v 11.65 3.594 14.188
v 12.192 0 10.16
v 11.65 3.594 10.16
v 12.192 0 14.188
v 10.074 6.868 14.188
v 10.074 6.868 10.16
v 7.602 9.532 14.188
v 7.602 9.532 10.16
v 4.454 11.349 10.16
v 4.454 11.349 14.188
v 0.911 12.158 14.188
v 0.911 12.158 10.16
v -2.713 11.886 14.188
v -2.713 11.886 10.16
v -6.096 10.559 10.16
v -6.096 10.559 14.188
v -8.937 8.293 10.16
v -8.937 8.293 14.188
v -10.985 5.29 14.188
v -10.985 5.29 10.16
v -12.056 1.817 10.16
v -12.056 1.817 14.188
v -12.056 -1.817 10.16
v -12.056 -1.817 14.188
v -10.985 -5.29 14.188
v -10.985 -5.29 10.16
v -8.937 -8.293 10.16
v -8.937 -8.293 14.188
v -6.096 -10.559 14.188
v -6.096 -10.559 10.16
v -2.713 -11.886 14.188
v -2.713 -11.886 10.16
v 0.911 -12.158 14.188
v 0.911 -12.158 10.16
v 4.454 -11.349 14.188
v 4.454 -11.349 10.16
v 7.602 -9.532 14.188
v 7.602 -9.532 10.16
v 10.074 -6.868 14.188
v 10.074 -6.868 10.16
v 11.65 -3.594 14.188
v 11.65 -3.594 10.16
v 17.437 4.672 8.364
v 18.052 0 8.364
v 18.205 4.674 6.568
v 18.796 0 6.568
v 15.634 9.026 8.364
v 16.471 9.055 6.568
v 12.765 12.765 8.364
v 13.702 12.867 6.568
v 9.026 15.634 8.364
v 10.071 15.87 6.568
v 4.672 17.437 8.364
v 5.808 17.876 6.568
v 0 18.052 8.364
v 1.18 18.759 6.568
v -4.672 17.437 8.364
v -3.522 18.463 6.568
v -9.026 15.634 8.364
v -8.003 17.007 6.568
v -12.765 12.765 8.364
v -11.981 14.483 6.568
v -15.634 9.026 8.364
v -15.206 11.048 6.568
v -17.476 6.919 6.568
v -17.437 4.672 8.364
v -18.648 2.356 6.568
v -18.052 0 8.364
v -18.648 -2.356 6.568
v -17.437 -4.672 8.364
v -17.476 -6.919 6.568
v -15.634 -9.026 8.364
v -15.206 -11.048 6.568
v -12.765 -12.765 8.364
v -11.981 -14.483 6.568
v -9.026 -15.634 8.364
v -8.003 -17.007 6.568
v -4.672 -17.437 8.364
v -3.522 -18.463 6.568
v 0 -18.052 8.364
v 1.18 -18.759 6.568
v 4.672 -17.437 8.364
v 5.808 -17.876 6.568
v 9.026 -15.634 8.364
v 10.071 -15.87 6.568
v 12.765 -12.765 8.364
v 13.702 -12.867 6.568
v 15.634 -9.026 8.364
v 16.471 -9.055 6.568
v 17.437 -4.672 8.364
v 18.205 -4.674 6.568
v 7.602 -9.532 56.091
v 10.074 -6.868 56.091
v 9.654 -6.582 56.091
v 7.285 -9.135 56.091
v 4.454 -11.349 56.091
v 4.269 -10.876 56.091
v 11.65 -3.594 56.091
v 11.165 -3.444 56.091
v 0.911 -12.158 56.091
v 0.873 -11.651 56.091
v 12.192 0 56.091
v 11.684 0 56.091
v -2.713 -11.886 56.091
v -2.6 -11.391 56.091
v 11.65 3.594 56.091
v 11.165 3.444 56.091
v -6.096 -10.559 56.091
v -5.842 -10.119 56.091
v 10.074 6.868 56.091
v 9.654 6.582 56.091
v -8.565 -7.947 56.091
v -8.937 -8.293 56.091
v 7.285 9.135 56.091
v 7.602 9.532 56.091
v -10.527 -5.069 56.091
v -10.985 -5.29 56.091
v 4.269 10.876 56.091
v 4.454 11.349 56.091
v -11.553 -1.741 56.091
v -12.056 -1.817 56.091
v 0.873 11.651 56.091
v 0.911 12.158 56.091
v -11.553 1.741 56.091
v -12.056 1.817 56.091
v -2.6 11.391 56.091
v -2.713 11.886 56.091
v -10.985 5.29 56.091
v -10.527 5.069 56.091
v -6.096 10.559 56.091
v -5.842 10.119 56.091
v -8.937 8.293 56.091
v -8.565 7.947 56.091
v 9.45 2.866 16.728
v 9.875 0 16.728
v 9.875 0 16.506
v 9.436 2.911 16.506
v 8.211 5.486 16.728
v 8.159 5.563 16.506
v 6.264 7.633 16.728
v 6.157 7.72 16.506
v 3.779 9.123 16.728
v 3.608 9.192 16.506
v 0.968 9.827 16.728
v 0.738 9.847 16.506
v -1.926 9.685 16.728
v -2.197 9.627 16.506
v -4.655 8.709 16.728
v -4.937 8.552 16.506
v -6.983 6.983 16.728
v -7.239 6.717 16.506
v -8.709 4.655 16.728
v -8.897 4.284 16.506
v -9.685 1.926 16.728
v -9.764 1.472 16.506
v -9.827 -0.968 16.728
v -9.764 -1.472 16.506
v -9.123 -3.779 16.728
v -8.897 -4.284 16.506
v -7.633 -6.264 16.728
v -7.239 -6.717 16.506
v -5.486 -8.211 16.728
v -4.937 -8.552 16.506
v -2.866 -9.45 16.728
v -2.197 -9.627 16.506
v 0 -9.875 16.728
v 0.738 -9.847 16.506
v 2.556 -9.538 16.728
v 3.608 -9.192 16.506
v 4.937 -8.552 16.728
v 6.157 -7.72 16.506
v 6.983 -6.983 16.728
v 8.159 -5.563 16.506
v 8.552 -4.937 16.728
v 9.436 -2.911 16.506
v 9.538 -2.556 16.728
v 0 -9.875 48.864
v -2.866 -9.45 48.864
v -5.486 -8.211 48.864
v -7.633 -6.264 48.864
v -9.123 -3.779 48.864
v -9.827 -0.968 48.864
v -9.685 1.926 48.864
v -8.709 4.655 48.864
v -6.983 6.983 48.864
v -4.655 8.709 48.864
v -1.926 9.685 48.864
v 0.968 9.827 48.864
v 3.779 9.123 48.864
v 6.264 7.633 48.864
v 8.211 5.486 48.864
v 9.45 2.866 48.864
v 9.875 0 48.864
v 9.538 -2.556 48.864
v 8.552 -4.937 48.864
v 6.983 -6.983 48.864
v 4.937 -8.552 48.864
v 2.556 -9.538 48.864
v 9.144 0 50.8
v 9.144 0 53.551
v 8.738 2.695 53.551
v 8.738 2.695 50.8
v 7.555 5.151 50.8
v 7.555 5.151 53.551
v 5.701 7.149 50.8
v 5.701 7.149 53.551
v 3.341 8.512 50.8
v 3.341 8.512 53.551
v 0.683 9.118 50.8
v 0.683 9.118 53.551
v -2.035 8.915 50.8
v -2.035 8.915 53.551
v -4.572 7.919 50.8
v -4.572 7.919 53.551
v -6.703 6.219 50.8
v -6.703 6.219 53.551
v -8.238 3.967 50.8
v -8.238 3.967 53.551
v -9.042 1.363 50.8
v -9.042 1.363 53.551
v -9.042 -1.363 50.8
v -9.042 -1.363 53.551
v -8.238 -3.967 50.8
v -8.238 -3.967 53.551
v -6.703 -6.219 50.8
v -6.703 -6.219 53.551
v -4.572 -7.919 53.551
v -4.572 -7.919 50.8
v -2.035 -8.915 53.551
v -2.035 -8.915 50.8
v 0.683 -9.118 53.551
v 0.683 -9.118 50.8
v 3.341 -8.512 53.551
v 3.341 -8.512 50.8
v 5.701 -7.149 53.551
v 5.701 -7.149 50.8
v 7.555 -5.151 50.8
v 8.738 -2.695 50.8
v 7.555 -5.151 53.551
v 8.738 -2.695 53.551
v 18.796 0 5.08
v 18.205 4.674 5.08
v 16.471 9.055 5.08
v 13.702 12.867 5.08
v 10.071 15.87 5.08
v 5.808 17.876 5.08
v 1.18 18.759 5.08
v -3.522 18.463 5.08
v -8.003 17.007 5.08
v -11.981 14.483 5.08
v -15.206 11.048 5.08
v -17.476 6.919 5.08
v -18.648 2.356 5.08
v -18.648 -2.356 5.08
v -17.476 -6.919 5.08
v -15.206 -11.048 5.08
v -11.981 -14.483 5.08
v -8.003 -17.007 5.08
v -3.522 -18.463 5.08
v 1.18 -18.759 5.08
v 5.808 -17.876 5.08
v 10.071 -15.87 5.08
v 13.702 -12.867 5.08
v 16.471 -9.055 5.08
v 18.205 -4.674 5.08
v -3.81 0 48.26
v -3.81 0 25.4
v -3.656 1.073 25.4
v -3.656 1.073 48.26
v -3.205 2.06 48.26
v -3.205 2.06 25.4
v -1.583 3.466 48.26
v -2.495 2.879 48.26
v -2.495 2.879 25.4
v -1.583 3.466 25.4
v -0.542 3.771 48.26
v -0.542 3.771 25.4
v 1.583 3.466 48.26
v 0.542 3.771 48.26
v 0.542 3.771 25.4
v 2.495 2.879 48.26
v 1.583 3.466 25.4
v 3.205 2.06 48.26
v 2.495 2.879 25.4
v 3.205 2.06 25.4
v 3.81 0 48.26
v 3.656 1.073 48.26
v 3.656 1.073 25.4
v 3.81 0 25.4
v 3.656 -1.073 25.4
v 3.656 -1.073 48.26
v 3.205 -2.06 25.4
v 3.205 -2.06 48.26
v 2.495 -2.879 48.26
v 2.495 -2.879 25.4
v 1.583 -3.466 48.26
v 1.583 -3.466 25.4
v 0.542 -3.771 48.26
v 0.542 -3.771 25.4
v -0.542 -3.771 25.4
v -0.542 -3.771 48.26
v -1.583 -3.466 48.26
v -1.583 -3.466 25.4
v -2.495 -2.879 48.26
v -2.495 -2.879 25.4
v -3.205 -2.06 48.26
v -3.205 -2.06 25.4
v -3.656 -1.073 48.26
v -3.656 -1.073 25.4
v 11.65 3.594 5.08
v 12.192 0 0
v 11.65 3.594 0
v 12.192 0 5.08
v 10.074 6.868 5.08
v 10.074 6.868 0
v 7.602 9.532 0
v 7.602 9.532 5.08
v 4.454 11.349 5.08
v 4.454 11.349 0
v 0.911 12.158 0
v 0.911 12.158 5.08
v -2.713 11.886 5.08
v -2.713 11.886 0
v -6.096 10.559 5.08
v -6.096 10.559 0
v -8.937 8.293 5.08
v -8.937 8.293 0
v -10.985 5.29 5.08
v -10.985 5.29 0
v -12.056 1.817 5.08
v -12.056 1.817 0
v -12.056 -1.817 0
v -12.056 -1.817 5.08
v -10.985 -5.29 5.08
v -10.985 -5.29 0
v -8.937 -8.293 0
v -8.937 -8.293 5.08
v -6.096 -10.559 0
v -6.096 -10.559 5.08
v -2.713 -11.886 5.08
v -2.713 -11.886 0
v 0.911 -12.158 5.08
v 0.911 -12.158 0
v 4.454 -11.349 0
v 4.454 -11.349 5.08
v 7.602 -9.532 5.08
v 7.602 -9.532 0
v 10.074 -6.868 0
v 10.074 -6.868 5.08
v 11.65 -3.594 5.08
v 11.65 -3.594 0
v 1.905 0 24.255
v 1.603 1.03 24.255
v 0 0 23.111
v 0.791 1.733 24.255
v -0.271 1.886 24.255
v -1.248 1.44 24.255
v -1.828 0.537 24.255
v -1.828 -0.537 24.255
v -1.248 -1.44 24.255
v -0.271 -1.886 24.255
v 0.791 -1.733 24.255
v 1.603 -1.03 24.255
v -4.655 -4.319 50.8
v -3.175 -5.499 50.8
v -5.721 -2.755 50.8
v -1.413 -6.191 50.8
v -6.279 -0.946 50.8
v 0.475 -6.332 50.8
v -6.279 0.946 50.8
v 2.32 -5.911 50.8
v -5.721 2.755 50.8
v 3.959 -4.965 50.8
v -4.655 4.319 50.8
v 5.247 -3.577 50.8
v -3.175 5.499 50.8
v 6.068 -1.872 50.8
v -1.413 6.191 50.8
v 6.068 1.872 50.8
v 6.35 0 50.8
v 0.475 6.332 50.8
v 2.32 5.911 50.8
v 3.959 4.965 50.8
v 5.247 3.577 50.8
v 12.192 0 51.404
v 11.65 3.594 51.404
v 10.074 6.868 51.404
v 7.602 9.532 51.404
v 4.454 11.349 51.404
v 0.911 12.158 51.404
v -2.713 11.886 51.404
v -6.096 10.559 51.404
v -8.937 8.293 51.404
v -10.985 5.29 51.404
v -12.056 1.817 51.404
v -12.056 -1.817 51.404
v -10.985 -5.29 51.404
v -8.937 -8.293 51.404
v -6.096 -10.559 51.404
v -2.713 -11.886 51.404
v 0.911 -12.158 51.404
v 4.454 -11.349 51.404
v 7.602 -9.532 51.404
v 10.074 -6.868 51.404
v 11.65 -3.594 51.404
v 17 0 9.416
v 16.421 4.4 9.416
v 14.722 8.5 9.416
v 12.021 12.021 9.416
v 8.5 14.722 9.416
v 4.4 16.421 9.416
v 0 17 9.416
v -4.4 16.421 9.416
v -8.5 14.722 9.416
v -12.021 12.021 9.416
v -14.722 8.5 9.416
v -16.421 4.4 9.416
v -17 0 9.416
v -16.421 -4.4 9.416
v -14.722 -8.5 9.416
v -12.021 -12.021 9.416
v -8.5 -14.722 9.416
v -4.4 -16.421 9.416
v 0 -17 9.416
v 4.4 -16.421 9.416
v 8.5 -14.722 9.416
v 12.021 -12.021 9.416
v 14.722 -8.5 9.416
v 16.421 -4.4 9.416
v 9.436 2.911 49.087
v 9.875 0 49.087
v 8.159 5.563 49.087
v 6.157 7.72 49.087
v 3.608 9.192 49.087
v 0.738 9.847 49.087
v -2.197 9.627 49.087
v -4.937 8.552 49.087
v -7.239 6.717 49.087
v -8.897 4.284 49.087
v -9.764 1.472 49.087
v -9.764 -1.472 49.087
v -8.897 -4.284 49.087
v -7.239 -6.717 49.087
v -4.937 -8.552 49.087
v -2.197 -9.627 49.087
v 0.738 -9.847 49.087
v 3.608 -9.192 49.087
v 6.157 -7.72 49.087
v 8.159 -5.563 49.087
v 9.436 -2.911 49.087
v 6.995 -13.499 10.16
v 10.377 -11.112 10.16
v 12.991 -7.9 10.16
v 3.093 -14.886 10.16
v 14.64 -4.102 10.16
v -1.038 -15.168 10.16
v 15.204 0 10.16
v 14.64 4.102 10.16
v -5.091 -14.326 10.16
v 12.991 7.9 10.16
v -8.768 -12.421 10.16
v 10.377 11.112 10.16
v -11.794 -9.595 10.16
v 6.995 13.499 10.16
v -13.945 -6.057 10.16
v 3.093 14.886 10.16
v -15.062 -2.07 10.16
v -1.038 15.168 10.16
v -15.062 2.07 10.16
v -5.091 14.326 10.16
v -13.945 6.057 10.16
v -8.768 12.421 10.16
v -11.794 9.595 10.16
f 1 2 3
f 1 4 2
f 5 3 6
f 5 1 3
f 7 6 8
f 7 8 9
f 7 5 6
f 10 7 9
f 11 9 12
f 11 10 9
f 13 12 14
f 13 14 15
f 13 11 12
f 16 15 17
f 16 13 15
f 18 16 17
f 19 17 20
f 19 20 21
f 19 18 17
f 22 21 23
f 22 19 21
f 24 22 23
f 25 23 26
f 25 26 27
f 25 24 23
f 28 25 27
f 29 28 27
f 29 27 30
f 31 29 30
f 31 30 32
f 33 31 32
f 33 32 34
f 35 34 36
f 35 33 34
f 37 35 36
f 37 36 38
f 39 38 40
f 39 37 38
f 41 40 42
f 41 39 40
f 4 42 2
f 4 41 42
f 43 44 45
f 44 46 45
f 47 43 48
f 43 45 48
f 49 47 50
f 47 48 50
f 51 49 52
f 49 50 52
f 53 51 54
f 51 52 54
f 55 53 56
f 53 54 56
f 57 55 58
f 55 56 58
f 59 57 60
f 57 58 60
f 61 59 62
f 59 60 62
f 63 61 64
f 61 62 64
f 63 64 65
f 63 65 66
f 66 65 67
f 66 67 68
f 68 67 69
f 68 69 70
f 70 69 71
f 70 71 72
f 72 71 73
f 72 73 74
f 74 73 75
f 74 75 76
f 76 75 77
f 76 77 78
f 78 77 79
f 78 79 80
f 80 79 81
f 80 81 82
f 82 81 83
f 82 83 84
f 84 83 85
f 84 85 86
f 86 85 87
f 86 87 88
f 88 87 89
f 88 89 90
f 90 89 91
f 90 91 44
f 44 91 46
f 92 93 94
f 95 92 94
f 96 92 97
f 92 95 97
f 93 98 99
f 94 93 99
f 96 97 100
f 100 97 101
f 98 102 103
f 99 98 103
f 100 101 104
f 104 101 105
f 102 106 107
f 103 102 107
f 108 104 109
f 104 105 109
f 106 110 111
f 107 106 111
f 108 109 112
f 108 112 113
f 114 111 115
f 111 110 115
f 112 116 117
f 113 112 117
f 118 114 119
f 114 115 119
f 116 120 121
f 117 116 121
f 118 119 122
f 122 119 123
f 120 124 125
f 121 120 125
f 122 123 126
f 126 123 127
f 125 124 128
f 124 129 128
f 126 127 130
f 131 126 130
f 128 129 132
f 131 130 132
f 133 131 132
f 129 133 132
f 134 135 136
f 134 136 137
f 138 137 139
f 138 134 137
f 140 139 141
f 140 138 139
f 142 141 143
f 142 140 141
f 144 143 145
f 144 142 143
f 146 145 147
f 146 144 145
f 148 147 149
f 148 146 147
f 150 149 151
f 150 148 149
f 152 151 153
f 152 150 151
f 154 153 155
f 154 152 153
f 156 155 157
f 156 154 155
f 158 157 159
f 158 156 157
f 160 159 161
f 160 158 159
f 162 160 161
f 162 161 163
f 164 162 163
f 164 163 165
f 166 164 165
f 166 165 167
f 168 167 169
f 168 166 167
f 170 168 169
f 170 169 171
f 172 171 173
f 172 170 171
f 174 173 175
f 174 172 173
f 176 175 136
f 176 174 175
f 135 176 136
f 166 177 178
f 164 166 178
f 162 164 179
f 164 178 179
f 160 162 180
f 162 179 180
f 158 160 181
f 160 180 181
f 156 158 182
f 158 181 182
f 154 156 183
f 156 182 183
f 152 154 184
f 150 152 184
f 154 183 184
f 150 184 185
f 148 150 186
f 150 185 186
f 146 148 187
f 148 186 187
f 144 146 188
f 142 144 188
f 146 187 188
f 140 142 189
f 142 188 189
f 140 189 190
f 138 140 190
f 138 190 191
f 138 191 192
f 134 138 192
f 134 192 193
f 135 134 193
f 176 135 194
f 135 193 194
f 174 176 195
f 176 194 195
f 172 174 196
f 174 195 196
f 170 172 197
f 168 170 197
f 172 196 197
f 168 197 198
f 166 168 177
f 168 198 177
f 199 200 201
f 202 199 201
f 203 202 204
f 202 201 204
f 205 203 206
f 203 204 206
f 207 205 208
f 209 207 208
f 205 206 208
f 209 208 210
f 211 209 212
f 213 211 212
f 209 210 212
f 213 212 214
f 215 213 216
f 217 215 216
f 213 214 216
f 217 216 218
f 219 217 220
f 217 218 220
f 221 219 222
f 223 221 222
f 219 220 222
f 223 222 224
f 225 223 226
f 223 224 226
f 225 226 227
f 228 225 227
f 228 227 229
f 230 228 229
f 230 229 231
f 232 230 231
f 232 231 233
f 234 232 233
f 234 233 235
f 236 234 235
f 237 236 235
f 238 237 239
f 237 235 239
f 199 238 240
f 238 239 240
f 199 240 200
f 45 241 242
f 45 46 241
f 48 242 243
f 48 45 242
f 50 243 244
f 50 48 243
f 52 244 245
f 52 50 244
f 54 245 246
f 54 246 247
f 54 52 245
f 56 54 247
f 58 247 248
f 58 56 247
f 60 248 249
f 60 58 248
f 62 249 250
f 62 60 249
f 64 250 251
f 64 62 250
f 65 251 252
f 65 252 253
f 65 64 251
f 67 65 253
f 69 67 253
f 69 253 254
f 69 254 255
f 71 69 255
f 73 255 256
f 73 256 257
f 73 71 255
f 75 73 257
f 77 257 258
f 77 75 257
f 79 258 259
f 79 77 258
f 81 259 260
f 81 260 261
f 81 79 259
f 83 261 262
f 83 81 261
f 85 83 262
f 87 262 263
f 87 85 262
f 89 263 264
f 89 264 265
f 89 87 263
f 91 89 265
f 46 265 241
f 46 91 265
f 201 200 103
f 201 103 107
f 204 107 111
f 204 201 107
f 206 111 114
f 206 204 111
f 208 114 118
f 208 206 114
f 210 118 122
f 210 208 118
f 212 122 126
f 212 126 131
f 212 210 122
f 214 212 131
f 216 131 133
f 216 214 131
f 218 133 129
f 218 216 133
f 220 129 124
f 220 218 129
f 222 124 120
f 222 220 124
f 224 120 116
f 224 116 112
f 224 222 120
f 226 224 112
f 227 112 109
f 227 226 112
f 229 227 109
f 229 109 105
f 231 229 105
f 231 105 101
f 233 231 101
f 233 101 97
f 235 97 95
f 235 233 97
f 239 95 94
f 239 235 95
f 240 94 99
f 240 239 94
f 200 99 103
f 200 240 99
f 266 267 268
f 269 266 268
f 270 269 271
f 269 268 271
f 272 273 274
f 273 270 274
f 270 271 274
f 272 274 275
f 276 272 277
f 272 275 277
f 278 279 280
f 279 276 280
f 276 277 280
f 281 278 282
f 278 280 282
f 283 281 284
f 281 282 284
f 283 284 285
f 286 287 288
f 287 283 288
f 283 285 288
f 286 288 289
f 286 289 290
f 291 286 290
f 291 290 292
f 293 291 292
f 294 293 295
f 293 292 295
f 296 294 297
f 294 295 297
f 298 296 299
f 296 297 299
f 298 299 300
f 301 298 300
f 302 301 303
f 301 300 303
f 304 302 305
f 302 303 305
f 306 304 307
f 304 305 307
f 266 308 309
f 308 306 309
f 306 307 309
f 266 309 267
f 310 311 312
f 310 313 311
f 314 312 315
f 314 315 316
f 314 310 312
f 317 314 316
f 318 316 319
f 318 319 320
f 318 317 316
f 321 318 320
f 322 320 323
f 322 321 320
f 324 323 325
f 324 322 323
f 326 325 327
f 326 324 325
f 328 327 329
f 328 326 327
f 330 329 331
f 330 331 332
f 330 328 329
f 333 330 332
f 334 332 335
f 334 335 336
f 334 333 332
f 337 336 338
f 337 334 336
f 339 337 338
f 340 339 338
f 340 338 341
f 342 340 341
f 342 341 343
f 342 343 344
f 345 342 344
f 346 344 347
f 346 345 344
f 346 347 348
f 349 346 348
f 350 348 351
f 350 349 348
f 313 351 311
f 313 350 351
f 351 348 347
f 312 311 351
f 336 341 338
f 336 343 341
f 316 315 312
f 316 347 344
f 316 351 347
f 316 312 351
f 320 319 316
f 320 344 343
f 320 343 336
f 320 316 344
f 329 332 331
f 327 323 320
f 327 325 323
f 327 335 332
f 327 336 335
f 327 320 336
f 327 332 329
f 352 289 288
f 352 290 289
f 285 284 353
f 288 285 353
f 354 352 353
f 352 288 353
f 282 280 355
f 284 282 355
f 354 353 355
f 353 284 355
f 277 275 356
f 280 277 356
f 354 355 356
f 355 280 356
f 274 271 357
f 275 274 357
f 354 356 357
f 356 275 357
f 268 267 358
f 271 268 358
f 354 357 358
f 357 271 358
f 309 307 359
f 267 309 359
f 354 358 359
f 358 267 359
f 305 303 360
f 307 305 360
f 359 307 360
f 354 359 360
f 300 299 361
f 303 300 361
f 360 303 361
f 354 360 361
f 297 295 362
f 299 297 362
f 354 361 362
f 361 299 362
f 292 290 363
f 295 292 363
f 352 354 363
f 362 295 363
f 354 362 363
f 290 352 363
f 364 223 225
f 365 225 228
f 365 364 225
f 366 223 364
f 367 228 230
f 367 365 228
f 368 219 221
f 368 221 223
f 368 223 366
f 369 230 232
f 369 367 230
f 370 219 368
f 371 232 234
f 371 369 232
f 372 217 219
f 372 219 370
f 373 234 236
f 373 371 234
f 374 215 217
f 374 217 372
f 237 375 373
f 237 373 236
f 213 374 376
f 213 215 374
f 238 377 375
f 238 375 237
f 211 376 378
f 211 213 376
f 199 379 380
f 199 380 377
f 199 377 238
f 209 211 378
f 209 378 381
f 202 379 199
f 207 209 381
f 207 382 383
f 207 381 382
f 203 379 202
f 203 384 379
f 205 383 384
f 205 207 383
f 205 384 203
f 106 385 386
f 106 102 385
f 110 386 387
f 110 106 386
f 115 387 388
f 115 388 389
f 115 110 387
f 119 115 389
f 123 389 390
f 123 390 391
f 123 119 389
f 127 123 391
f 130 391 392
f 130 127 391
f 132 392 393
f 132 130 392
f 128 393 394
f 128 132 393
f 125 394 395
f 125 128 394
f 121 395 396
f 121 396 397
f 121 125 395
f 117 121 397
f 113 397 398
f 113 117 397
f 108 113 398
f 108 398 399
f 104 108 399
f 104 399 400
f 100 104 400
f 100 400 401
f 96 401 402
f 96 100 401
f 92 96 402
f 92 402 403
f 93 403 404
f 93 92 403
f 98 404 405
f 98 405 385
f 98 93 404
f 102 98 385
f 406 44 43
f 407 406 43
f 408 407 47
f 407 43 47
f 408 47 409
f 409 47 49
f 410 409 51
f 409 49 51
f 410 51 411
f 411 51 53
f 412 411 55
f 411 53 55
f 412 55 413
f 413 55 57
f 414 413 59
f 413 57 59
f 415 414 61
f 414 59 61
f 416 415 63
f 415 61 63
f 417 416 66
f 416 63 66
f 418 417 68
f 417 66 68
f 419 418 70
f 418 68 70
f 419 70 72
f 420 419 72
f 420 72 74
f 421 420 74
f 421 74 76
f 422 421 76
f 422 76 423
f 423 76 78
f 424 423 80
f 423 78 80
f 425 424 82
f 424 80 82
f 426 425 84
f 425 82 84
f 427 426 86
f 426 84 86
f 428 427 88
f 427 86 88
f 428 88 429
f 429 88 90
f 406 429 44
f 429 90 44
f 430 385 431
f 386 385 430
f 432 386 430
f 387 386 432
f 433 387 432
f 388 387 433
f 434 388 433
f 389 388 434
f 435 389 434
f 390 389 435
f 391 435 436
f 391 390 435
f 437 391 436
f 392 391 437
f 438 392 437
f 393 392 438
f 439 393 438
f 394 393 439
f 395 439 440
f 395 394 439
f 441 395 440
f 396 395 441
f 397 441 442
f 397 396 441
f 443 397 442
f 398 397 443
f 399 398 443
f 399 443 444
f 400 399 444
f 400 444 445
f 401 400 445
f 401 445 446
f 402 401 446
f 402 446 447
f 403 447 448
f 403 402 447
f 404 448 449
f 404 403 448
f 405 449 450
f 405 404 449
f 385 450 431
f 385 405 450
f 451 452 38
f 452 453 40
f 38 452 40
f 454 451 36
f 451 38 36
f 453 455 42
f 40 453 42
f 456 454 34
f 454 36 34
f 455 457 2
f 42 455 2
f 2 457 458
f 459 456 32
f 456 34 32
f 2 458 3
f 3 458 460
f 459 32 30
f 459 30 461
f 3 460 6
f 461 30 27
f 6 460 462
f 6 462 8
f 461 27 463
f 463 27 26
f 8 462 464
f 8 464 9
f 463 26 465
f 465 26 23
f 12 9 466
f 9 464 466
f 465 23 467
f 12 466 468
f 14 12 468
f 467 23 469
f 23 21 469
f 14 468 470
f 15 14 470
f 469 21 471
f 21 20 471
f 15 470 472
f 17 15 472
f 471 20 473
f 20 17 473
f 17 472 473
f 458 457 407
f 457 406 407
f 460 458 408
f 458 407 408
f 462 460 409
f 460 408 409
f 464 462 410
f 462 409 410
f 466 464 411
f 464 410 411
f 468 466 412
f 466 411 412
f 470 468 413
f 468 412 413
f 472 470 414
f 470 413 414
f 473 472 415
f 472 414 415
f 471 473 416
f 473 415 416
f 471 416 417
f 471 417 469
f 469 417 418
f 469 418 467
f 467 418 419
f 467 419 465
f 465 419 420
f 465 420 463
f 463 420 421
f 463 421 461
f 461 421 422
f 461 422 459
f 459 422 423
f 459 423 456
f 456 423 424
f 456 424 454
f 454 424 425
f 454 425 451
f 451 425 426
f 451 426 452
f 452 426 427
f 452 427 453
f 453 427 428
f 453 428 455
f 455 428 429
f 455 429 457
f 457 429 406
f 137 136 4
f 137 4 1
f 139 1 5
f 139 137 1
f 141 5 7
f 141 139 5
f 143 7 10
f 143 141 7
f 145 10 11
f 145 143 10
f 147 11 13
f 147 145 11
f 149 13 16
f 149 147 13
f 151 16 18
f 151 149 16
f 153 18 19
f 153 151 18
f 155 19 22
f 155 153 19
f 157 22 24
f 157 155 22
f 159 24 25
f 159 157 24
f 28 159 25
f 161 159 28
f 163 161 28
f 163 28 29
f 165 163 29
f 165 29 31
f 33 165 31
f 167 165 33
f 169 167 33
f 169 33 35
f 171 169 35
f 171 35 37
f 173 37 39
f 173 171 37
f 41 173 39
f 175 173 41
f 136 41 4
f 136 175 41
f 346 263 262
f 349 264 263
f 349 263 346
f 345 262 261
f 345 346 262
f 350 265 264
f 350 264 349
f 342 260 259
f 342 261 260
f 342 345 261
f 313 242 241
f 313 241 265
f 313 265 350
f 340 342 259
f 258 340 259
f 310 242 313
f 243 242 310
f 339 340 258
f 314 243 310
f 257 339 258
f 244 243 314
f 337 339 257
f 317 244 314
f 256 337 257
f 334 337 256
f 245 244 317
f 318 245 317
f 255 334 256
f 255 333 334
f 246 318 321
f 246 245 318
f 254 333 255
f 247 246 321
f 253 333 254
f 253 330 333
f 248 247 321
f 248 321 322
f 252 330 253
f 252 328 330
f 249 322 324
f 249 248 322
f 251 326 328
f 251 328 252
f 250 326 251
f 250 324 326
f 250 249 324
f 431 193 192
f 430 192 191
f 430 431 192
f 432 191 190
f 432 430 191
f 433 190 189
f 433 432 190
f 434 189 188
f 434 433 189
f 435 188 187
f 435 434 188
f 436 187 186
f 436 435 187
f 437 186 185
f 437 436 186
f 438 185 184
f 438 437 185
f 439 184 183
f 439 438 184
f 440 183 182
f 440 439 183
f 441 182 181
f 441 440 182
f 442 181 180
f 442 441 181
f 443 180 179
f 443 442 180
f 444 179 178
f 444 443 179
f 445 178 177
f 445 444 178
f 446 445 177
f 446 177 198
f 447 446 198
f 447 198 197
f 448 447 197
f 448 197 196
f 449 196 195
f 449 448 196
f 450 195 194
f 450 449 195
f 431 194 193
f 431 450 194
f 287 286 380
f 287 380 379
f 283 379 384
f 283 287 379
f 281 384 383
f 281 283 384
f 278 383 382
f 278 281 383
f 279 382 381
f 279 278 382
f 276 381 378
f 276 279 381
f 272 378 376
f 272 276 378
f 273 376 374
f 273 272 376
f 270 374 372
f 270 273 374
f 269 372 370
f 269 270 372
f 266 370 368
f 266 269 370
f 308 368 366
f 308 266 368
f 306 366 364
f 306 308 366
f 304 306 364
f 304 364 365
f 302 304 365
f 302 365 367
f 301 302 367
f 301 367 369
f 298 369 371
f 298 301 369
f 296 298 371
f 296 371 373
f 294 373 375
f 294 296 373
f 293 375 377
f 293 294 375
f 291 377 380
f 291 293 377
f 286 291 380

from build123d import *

# Parameters (mm, degrees)
F0_W         = 6.096
F0_H         = 5.08
F0_W_2       = 3.048
F0_H_2       = 5.2907199979
F0_W_3       = 6.604
F2_SIZE      = 2.54
F3_SIZE      = 2.54
F5_D         = 7.62
F5_DEPTH     = 25.4
F5_TIP       = 2.2892789585
F6_W         = 7.272795774
F6_H         = 32.1356244385
F8_S5_R      = 9.8747471347
F8_T6_DEPTH  = 19
F8_S11_R     = 9.8747471347
F8_T12_DEPTH = 19


# Not quite as in the source:
# - a fillet or chamfer that OpenCascade refuses, or shapes differently, is made with other operations: its cross-section is extruded or revolved along the edge and cut away or added


with BuildPart() as f1:
    # F0 (on Front) → F1 (revolve)
    with BuildSketch(Plane.XZ):
        with Locations((9.144, 2.54)):
            Rectangle(F0_W, F0_H)
        Polygon((0, 50.8), (0, 47.4797748029), (6.096, 50.8), align=None)
        with Locations((9.144, 7.62)):
            Rectangle(F0_W, F0_H)
        with Locations((10.668, 53.4453599989)):
            Rectangle(F0_W_2, F0_H_2)
        Polygon((0, 47.4797748029), (0, 0), (6.096, 0), (6.096, 5.08), (6.096, 10.16), (12.192, 10.16), (12.192, 50.8), (9.144, 50.8), (6.096, 50.8), align=None)
        with Locations((15.494, 7.62)):
            Rectangle(F0_W_3, F0_H)
    revolve(axis=Axis((0, 0, 25.4), (0, 0, 1)))

    # F2
    f2_edges = [f1.edges().sort_by_distance(p)[0] for p in [
        (-9.144, 0, 56.09072),
    ]]
    chamfer(f2_edges, length=F2_SIZE)

    # F3
    f3_edges = [f1.edges().sort_by_distance(p)[0] for p in [
        (-18.796, 0, 10.16),
    ]]
    chamfer(f3_edges, length=F3_SIZE)

    # F5
    with Locations(Plane.XY.offset(50.8)):
        with Locations((0, 0)):
            Hole(F5_D / 2, depth=F5_DEPTH)
            with Locations((0, 0, -(F5_DEPTH + F5_TIP / 2))):  # 118° drill point
                Cone(0, F5_D / 2, F5_TIP, mode=Mode.SUBTRACT)

    # F6 (on Right) → F7 (revolve, cut)
    with BuildSketch(Plane.YZ):
        with Locations((-13.5111450218, 32.7963028103)):
            Rectangle(F6_W, F6_H)
    revolve(axis=Axis((0, 0, 32.7963028103), (0, 0, -1)), mode=Mode.SUBTRACT)

    # F8: chamfer of 2.54 on 5 edges, made by hand


with BuildPart() as f8_tool2:
    # F8_s3 → F8_t4 (revolve)
    with BuildSketch(Plane.XZ):
        Polygon((9.652, 48.8641150296), (12.192, 51.4041150296), (12.192, 48.8641150296), align=None)
    revolve(axis=Axis((0, 0, 48.8641150296), (0, 0, 1)))

    # F8_s5 → F8_t6 (cut, symmetric)
    with BuildSketch(Plane.XY.offset(50.1)):
        Circle(F8_S5_R)
    extrude(amount=F8_T6_DEPTH, both=True, mode=Mode.SUBTRACT)


with BuildPart() as f1_1:
    add(f1.part)

    # F8_t1: cut F8_tool2
    add(f8_tool2.part, mode=Mode.SUBTRACT)


with BuildPart() as f8_tool8:
    # F8_s9 → F8_t10 (revolve)
    with BuildSketch(Plane.XZ):
        Polygon((12.192, 14.188490591), (9.652, 16.728490591), (12.192, 16.728490591), align=None)
    revolve(axis=Axis((0, 0, 16.728490591), (0, 0, 1)))

    # F8_s11 → F8_t12 (cut, symmetric)
    with BuildSketch(Plane.XY.offset(15.5)):
        Circle(F8_S11_R)
    extrude(amount=F8_T12_DEPTH, both=True, mode=Mode.SUBTRACT)


with BuildPart() as f1_2:
    add(f1_1.part)

    # F8_t7: cut F8_tool8
    add(f8_tool8.part, mode=Mode.SUBTRACT)

    # F8_s13 → F8_t14 (revolve, cut)
    with BuildSketch(Plane.XZ):
        Polygon((15.2038975516, 10.16), (16.9999487758, 9.4160512242), (16.256, 10.16), align=None)
    revolve(axis=Axis((0, 0, 10.16), (0, 0, 1)), mode=Mode.SUBTRACT)

    # F8_s15 → F8_t16 (revolve, cut)
    with BuildSketch(Plane.XZ):
        Polygon((18.0520512242, 8.3639487758), (18.796, 6.5678975516), (18.796, 7.62), align=None)
    revolve(axis=Axis((0, 0, 7.62), (0, 0, 1)), mode=Mode.SUBTRACT)

    # F8_s17 → F8_t18 (revolve, cut)
    with BuildSketch(Plane.XZ):
        Polygon((6.35, 50.8), (3.81, 48.26), (3.81, 50.8), align=None)
    revolve(axis=Axis((0, 0, 50.8), (0, 0, 1)), mode=Mode.SUBTRACT)


solid = f1_2.part
